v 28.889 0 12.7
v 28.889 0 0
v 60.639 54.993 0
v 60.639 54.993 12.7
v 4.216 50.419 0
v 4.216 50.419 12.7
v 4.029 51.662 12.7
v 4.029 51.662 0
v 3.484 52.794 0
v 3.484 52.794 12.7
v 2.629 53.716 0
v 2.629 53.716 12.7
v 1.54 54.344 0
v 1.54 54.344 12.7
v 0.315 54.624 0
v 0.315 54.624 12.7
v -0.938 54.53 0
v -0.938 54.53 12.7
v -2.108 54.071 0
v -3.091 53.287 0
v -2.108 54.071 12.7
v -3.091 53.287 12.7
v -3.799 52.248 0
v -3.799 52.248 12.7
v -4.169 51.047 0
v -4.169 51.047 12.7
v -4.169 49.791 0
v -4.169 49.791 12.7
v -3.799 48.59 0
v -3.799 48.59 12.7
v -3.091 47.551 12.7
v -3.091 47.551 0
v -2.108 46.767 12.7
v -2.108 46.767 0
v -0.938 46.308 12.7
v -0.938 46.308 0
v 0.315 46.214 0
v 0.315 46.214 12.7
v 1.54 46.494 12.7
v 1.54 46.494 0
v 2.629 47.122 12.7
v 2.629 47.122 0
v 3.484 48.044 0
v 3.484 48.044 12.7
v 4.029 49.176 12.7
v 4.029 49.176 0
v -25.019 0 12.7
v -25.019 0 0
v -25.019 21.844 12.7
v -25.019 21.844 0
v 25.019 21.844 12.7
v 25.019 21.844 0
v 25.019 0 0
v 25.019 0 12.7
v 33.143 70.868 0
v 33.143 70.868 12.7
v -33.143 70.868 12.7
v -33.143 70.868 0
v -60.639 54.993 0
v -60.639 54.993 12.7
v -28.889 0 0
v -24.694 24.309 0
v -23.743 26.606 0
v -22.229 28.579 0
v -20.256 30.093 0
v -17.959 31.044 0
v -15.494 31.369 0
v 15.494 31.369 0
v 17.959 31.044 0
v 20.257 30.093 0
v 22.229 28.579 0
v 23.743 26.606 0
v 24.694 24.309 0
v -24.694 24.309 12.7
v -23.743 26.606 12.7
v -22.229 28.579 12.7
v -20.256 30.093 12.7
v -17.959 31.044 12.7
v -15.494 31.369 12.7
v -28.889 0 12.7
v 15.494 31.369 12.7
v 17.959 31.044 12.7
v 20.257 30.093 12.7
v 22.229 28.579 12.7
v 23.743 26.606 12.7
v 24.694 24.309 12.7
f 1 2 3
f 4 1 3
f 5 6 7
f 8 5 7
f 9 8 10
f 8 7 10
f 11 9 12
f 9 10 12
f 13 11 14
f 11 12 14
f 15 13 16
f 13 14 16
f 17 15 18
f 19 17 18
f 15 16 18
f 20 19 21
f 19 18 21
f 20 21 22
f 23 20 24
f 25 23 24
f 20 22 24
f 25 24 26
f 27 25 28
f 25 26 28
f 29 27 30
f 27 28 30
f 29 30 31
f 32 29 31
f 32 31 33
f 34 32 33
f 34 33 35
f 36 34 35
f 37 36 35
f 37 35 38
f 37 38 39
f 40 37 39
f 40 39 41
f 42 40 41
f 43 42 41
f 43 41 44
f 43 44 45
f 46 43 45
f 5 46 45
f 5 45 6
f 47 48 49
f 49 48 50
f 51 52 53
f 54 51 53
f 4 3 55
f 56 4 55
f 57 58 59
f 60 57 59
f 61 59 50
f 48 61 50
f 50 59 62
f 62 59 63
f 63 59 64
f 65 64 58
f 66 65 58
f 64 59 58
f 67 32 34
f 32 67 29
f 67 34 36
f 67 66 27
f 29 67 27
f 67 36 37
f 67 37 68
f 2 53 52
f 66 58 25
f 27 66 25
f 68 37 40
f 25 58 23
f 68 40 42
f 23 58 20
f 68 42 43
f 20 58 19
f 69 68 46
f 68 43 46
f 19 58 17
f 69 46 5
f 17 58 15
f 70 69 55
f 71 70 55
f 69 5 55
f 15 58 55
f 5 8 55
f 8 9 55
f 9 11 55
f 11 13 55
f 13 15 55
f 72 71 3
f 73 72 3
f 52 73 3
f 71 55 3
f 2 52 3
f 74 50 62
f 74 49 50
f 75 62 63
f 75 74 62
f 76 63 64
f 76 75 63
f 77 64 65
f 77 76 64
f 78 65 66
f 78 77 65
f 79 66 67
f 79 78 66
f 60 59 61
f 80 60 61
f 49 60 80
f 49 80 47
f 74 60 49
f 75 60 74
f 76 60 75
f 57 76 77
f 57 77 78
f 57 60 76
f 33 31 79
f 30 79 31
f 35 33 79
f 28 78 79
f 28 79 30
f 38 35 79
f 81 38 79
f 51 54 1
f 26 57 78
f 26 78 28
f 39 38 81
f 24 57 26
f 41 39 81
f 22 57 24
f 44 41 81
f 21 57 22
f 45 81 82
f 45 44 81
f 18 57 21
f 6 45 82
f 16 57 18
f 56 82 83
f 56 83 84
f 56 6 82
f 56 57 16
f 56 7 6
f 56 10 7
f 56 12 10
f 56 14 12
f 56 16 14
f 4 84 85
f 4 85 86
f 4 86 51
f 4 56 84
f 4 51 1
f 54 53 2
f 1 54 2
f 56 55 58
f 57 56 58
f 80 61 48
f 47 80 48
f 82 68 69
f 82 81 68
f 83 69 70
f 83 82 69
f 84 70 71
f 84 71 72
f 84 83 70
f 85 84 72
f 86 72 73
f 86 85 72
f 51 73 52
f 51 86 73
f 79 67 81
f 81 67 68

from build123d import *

# Parameters (mm, degrees)
BOSS_EXTRUDE1_DEPTH      = 12.7
FILLET1_R                = 9.525
F_5_16_CLEARANCE_HOLE1_D = 8.4328


with BuildPart() as part:
    # Sketch1 → Boss-Extrude1 (new body)
    with BuildSketch(Plane.XY):
        Polygon((25.019, 0), (28.88945277, 0), (60.63945277, 54.99261314), (33.1431462, 70.86761314), (-33.1431462, 70.86761314), (-60.63945277, 54.99261314), (-28.88945277, 0), (-25.019, 0), (-25.019, 31.369), (25.019, 31.369), align=None)
    extrude(amount=BOSS_EXTRUDE1_DEPTH)

    # Fillet1
    fillet1_edges = [part.edges().sort_by_distance(p)[0] for p in [
        (25.019, 31.369, 6.35),
        (-25.019, 31.369, 6.35),
    ]]
    fillet(fillet1_edges, radius=FILLET1_R)

    # 5/16 Clearance Hole1 (through all)
    with Locations(Plane(origin=(0, 0, 0), x_dir=(-1, 0, 0), z_dir=(0, 0, -1))):
        with Locations((0, 50.419)):
            Hole(F_5_16_CLEARANCE_HOLE1_D / 2)


solid = part.part
